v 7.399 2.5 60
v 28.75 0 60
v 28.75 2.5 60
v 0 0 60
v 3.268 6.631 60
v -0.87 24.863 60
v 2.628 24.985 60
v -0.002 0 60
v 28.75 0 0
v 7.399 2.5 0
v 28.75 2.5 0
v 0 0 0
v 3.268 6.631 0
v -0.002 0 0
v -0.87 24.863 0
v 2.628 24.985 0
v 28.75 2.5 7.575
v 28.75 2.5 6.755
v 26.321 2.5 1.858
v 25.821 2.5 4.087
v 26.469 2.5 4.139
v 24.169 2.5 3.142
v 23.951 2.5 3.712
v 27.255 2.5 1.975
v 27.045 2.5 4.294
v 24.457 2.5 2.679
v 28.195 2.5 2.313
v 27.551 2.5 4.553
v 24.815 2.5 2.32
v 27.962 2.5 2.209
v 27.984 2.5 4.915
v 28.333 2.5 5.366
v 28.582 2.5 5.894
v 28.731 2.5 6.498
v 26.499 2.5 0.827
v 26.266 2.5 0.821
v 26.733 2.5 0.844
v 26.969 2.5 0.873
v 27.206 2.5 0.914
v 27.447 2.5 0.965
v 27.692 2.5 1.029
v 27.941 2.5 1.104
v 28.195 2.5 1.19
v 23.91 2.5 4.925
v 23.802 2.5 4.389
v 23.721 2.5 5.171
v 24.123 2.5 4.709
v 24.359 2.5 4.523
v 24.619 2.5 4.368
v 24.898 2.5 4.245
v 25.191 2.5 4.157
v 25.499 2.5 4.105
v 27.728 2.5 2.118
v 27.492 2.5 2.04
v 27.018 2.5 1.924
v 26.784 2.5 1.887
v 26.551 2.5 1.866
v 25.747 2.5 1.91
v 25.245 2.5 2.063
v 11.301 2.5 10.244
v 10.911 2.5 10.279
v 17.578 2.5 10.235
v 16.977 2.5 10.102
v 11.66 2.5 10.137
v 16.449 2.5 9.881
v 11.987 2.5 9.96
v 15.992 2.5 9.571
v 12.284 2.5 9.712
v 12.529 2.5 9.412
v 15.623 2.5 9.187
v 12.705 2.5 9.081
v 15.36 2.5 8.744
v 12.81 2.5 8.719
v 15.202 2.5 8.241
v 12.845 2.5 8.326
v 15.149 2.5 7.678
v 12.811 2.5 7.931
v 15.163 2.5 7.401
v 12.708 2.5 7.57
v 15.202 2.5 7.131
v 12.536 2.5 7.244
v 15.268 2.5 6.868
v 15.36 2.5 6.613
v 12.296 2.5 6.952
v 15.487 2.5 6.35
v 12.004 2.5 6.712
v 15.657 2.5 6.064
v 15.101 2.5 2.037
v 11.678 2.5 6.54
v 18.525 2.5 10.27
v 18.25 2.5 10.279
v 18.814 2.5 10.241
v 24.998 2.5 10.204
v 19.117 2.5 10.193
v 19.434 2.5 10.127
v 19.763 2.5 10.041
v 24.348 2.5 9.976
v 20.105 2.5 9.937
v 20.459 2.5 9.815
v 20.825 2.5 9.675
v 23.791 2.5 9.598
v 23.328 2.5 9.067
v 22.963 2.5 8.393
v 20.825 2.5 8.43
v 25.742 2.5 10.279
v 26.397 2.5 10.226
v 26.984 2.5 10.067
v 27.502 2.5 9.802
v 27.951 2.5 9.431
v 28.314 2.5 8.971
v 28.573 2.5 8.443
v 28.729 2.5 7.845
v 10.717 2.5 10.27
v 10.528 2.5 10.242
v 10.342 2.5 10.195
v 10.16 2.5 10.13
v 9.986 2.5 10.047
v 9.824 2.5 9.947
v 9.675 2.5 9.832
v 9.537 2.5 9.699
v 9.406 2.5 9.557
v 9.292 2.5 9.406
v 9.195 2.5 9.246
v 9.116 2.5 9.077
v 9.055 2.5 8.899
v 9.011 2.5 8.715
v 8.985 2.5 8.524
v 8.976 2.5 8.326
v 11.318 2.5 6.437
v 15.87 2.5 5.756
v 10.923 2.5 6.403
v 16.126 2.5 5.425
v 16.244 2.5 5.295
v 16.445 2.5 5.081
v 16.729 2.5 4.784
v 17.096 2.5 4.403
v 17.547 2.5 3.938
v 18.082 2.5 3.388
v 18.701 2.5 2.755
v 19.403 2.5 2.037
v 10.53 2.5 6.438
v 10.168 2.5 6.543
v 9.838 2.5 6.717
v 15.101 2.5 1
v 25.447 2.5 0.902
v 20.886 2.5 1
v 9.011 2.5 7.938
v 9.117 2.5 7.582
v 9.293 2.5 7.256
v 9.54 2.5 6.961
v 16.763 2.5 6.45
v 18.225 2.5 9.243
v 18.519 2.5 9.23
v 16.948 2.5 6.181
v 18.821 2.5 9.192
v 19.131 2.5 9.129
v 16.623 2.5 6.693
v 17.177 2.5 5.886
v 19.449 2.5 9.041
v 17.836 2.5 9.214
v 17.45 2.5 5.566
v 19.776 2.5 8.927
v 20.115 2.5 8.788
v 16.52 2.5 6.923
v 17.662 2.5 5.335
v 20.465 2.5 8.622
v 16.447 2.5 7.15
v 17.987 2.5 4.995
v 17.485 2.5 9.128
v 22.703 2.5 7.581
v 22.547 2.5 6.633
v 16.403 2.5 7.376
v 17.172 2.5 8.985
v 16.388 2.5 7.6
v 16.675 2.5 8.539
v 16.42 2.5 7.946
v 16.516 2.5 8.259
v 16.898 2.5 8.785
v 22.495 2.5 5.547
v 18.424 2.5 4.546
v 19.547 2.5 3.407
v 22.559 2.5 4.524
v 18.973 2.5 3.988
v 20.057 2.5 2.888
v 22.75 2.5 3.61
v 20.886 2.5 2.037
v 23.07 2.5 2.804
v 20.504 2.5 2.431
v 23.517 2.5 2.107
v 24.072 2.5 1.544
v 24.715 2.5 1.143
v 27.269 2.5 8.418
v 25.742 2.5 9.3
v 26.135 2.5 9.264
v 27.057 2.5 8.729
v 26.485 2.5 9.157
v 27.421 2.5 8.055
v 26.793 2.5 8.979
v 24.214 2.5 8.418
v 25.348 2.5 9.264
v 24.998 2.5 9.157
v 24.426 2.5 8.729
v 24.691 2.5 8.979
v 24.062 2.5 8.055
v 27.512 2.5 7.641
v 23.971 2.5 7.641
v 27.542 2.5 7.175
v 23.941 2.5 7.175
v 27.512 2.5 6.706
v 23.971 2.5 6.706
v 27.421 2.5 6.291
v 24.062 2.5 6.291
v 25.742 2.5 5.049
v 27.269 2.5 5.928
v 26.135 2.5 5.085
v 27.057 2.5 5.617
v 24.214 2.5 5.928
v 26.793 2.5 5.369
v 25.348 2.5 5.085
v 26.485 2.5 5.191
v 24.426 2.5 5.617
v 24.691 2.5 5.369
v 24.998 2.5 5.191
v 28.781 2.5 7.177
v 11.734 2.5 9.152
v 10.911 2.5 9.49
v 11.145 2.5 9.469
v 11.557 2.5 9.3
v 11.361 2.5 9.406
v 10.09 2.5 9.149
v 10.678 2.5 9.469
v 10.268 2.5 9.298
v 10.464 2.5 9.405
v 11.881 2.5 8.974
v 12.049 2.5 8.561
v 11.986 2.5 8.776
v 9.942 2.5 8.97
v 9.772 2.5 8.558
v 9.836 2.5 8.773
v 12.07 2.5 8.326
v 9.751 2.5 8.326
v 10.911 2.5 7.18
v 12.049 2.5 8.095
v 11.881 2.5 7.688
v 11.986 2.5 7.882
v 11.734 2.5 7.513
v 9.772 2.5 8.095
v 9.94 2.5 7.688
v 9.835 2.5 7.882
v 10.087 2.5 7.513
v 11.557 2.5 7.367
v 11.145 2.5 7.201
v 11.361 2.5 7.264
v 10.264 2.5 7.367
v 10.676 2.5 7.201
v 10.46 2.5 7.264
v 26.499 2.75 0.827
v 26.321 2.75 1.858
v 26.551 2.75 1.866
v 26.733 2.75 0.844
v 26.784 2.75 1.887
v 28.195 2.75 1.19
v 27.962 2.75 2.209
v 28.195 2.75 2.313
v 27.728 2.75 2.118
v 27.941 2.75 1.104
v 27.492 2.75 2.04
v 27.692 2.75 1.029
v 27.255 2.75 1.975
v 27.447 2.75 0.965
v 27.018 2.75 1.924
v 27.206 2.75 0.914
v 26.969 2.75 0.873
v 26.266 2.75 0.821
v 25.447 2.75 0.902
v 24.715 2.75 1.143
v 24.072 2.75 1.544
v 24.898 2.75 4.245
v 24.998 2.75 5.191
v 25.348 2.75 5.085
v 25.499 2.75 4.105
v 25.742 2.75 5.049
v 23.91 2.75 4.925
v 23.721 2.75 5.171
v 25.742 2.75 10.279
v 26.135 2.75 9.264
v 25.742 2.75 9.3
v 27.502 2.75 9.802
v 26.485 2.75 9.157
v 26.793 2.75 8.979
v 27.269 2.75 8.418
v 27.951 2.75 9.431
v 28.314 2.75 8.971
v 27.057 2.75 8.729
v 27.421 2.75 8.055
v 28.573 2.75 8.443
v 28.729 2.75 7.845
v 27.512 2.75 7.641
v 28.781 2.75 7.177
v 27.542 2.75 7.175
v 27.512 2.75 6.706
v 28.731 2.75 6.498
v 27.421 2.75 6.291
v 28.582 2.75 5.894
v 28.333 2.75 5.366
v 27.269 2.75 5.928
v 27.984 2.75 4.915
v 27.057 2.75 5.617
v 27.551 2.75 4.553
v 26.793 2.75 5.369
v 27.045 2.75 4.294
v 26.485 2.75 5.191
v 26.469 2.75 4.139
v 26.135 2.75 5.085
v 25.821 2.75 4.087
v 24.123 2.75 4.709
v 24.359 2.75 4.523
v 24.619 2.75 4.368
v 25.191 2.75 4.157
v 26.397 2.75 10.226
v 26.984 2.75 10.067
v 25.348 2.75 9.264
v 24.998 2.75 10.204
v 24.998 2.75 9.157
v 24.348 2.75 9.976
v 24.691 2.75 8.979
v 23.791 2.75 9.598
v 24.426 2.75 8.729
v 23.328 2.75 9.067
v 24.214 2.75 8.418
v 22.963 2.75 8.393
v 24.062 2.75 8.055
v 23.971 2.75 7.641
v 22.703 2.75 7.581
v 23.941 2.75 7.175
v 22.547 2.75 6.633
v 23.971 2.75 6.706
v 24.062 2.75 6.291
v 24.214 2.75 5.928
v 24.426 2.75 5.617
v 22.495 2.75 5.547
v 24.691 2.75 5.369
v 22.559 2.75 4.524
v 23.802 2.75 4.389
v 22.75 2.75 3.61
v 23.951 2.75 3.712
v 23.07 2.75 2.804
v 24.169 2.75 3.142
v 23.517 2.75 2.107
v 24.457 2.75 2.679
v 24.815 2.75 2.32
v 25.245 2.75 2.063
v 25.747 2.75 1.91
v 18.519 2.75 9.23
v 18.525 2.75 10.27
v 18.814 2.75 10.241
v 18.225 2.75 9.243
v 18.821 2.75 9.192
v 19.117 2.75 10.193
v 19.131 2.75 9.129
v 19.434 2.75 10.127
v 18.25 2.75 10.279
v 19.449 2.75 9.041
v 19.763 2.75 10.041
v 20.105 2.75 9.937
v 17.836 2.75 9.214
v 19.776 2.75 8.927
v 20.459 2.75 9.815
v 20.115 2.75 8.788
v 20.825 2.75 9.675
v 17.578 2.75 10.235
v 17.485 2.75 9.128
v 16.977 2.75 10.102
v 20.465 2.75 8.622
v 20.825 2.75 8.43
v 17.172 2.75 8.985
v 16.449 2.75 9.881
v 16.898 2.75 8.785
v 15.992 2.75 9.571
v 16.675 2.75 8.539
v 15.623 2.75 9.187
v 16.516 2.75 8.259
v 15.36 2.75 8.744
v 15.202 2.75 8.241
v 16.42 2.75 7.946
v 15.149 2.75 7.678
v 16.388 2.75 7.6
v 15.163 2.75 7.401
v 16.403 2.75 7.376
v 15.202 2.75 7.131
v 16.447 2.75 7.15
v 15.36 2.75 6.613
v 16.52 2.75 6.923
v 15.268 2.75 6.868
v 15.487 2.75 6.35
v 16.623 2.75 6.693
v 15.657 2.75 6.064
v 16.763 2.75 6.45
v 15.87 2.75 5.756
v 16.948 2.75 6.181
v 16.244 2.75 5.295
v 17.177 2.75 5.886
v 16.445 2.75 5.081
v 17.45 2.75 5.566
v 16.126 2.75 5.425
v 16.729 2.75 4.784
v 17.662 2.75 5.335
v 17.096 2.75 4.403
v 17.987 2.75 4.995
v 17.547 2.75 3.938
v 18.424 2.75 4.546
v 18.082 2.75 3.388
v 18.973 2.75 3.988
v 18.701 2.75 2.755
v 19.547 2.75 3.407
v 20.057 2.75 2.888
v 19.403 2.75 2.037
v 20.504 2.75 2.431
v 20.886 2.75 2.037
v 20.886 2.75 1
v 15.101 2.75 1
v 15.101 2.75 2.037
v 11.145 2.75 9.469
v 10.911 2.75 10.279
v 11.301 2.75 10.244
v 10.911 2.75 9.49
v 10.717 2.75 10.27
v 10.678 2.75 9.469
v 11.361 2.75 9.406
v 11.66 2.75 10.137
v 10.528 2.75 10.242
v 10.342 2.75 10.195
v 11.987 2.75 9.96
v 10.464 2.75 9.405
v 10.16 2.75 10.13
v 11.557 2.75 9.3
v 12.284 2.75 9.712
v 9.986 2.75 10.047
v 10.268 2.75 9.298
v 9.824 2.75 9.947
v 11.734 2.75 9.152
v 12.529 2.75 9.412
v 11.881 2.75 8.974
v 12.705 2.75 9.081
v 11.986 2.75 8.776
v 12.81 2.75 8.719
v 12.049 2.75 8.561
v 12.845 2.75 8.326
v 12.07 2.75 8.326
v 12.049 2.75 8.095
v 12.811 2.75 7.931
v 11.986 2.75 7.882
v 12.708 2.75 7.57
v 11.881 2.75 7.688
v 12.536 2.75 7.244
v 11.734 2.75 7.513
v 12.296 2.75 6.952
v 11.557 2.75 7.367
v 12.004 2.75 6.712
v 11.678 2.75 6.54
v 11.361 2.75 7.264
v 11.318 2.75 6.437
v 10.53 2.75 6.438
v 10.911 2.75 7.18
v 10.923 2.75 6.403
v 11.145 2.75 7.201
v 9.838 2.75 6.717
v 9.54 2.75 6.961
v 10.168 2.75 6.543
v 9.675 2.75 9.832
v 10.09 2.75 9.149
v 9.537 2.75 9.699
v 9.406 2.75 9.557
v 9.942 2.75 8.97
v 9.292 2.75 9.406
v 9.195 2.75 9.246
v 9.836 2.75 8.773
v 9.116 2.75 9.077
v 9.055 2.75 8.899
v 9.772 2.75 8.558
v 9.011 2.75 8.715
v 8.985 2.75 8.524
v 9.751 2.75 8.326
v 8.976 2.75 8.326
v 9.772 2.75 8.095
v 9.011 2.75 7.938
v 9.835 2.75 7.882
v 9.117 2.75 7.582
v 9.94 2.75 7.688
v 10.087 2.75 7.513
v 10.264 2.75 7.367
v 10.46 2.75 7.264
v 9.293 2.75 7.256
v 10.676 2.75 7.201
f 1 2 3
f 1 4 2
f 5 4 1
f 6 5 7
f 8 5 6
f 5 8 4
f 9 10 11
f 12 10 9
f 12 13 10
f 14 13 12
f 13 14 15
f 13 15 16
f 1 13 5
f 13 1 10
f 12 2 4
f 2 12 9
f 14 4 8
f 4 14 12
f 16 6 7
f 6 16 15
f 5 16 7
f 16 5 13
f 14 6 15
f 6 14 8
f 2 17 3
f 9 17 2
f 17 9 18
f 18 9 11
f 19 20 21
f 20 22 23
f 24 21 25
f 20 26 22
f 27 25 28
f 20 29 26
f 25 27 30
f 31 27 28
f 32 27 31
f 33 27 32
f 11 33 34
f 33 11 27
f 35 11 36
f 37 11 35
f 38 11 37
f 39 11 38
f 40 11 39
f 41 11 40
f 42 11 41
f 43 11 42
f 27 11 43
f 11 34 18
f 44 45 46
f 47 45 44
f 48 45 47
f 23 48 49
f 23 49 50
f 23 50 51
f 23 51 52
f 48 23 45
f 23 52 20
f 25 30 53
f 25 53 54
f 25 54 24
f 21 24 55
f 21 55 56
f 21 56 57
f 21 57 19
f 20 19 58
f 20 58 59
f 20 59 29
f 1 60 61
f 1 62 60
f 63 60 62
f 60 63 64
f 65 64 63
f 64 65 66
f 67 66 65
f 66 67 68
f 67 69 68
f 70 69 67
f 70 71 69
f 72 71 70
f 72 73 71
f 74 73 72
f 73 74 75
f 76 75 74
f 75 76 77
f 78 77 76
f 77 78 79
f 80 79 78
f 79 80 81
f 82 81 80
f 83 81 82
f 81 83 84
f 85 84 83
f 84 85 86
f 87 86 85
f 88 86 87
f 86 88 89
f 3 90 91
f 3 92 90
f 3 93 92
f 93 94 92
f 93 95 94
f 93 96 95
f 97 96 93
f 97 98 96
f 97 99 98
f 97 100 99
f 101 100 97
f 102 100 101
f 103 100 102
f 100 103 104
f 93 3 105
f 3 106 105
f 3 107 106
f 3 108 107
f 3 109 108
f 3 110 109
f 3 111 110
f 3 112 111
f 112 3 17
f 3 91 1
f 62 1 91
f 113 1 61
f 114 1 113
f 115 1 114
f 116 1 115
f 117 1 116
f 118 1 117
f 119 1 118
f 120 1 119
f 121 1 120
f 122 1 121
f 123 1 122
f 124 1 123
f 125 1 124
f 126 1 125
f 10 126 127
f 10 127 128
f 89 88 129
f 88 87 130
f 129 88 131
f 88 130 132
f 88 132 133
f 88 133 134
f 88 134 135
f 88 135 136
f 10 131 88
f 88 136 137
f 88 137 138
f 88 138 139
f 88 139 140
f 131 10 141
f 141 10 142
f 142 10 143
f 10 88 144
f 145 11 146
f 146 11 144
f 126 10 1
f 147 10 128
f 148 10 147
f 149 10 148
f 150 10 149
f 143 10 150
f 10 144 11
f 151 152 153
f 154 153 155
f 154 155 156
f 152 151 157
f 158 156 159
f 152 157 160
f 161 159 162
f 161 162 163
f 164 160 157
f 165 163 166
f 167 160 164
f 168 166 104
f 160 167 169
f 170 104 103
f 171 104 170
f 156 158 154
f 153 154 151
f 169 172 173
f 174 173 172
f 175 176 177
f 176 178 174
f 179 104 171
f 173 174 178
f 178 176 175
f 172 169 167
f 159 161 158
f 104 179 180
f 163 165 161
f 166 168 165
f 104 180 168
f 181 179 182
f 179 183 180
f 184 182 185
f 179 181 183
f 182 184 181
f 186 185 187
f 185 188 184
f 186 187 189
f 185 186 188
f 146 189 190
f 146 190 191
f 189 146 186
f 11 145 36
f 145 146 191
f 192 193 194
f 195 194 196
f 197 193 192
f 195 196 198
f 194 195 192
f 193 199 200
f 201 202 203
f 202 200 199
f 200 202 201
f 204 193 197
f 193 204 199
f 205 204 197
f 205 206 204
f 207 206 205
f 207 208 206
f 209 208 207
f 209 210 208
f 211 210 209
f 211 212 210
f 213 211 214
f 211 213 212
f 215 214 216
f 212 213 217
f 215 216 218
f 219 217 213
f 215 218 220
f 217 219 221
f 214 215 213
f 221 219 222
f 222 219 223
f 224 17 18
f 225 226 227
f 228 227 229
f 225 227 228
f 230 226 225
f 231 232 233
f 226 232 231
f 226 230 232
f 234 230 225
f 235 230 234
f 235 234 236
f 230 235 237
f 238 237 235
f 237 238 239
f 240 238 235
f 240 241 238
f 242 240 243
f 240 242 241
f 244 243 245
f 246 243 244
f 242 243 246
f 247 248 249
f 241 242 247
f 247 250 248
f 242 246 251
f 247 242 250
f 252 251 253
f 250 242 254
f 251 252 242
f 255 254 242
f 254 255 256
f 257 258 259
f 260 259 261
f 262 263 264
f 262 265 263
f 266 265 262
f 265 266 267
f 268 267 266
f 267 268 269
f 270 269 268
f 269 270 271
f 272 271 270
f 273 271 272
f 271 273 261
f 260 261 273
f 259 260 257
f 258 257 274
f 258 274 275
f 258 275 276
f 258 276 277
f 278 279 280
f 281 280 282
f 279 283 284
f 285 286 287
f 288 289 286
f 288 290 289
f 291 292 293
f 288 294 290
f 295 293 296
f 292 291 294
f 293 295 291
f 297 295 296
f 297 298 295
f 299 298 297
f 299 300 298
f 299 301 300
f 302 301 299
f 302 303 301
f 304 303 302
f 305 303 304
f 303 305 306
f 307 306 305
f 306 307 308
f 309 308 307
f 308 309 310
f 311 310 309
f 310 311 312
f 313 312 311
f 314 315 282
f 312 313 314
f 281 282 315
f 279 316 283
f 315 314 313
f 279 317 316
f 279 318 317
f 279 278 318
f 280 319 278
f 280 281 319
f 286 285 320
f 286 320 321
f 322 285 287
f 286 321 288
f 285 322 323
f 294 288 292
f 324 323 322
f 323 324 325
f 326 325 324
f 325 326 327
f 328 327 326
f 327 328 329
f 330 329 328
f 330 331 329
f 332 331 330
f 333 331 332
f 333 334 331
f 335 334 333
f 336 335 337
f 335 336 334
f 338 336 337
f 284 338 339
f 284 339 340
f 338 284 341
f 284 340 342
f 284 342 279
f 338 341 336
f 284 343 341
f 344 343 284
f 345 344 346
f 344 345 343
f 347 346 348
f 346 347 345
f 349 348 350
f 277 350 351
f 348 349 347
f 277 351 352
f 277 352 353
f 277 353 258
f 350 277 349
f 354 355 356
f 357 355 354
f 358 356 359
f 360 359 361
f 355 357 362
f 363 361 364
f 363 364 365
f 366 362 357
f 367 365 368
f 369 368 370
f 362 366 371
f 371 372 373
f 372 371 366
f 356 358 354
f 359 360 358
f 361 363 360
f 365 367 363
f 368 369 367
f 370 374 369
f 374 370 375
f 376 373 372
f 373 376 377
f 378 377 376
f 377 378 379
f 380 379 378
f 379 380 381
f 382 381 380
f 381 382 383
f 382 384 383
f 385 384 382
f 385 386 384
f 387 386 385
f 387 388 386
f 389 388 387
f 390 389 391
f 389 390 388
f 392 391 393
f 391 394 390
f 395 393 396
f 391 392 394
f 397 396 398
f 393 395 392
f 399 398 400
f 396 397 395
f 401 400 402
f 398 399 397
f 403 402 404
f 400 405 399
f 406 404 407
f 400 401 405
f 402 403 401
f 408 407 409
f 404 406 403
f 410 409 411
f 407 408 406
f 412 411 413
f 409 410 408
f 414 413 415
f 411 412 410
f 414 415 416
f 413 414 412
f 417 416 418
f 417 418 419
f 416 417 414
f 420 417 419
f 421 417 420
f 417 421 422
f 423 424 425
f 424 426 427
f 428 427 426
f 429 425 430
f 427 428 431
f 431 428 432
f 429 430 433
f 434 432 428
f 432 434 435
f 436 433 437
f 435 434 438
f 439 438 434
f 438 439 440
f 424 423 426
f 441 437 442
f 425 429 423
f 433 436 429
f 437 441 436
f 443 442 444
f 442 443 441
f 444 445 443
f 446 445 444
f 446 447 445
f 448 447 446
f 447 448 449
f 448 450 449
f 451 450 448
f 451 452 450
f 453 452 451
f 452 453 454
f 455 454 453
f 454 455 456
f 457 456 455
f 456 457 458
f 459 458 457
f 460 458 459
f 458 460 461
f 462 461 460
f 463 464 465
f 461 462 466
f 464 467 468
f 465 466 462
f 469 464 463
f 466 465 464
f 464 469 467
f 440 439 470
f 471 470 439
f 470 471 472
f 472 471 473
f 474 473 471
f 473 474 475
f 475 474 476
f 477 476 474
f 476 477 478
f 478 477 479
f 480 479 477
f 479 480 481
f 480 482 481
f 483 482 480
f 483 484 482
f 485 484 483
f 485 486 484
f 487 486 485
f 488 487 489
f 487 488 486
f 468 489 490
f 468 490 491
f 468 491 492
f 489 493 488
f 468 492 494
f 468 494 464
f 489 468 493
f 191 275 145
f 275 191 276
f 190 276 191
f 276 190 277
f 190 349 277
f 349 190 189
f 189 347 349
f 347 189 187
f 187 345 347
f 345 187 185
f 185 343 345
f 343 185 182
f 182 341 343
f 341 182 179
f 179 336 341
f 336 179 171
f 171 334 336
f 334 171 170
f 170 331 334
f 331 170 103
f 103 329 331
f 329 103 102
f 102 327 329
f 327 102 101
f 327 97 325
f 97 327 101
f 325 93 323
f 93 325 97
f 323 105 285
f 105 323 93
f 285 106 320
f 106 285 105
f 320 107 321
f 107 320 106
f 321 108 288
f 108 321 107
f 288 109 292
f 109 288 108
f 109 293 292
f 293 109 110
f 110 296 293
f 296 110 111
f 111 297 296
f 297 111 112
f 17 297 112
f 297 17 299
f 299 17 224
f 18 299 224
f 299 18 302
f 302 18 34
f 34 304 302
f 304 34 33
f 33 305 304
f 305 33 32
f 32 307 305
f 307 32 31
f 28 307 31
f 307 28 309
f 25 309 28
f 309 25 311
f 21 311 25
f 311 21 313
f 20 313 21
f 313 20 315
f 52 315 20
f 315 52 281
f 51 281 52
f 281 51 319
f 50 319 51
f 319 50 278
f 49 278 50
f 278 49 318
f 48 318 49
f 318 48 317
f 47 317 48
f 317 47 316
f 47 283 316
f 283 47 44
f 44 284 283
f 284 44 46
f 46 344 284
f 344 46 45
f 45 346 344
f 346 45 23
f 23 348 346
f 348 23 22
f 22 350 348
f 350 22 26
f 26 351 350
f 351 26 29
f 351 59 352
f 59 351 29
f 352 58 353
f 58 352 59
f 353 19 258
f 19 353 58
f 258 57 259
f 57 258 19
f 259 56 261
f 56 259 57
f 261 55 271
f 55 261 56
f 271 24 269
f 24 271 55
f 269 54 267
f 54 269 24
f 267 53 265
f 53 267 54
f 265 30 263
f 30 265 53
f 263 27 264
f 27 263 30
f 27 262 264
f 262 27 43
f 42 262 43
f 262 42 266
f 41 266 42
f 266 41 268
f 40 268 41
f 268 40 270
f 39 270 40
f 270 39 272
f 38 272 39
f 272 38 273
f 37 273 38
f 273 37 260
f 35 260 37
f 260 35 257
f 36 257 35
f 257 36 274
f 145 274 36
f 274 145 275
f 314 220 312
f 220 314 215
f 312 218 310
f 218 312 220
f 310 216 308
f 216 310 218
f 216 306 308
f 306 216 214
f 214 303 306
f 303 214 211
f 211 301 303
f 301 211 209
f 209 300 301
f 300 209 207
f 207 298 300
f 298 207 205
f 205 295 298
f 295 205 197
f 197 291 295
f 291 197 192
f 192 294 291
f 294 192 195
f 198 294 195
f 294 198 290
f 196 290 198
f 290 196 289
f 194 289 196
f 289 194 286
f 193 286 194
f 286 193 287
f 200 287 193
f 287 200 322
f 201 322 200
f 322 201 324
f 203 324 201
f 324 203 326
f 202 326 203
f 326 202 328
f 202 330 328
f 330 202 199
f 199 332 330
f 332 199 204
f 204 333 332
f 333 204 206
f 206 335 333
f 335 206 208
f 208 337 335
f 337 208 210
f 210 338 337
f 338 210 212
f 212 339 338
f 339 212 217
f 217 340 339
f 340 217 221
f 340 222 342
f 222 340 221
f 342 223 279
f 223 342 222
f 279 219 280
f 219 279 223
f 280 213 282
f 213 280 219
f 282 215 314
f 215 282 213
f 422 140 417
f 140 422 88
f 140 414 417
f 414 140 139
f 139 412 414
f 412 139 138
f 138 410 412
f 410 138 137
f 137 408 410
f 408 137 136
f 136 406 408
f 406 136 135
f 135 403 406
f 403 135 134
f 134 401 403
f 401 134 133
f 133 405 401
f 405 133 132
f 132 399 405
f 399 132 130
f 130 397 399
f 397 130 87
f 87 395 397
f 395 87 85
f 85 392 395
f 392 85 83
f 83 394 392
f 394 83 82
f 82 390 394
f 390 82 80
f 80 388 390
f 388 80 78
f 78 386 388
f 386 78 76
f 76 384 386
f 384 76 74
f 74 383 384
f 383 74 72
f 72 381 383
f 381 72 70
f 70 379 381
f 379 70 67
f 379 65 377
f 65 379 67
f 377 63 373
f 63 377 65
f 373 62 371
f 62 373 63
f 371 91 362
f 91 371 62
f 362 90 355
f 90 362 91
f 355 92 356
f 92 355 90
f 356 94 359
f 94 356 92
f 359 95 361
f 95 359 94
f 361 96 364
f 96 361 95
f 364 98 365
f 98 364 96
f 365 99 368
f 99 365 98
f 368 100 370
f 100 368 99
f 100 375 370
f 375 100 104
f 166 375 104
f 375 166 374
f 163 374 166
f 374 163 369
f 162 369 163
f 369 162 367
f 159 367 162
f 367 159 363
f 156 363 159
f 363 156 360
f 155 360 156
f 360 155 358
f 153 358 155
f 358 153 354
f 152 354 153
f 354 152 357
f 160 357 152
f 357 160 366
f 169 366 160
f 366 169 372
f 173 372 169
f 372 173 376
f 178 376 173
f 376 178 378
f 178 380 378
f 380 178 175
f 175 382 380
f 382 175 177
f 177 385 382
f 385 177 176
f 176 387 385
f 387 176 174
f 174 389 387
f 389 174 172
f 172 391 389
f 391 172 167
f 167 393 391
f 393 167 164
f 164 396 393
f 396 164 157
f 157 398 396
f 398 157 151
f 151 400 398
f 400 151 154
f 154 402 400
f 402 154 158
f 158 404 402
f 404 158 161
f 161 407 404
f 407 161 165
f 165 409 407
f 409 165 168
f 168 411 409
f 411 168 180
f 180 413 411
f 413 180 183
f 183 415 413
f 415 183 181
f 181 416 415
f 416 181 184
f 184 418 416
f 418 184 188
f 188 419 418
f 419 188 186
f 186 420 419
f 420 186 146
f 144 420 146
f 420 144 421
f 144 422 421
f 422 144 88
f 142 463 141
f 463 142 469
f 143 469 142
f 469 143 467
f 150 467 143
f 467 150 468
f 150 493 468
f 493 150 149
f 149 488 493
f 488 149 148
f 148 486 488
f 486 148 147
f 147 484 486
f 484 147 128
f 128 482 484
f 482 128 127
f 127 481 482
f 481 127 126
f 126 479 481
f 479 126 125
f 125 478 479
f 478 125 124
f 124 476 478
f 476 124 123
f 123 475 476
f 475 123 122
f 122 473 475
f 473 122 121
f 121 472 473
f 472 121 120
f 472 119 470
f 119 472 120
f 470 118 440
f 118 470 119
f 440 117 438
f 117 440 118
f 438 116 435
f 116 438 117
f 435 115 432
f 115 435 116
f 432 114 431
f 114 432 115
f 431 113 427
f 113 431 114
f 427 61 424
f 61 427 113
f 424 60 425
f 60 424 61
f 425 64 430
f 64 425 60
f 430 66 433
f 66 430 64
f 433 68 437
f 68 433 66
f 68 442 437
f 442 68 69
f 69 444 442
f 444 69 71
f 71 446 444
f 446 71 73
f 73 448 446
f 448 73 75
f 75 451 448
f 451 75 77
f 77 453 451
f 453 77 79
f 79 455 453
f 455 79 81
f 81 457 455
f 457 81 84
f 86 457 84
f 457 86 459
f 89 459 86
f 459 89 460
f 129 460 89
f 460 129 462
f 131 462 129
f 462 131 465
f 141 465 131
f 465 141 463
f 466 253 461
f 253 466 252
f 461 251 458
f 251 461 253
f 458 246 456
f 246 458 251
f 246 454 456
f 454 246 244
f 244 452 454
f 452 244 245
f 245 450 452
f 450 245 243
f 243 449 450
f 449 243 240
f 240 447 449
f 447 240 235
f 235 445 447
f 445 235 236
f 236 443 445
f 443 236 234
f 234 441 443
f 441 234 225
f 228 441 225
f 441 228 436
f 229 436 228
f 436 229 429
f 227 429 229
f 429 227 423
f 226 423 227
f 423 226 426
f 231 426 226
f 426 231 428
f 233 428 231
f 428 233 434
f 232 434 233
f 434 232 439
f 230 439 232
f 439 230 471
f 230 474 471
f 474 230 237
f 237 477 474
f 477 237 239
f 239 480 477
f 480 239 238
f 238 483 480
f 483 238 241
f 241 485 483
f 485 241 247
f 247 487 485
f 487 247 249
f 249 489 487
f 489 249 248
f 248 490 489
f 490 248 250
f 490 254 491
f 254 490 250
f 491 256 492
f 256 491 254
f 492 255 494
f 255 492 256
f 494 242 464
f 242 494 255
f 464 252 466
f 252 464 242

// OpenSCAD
file_rest_width = 25;
ski_rest_width = 30;
file_rest_thickness = 3.5;
ski_rest_thickness = 2.5;
height = 60;
angle = 92;
text_height = 9;
text_thickness = 0.25;

reinforcement_width = 14;
reinforcement_proportion = 1.0;

color("green")
difference() {
    translate([0, -reinforcement_width * sqrt(2) / 2, (height - height * reinforcement_proportion) / 2])
        rotate([0, 0, 45])
            cube([reinforcement_width, reinforcement_width, height * reinforcement_proportion]);
    
    translate([0, -2 * reinforcement_width, (height - height * reinforcement_proportion) / 2])
        cube([2 * reinforcement_width, 2 * reinforcement_width, height * reinforcement_proportion]);
    translate([-2 * reinforcement_width, -reinforcement_width, (height - height * reinforcement_proportion) / 2])
        cube([2 * reinforcement_width, 2 * reinforcement_width, height * reinforcement_proportion]);
}


color("red")
cube([ski_rest_width - ski_rest_thickness / 2, ski_rest_thickness, height]);

color("blue")
difference() {
    translate([file_rest_thickness, 0, 0])
        rotate([0, 0, angle])
            cube([file_rest_width, file_rest_thickness, height]);
    
    translate([-ski_rest_thickness, -ski_rest_thickness, 0])
        cube([ski_rest_width - ski_rest_thickness / 2, ski_rest_thickness, height]);
}
            

    
translate([ski_rest_width - 1.25 * text_height, ski_rest_thickness, 1])
    rotate([90, 0, 180])
        linear_extrude(height = text_thickness)
            text(
                font = "Arial Rounded MT Bold",
                text = str(angle, "°"),
                size = text_height,
                halign = "center"
            );
